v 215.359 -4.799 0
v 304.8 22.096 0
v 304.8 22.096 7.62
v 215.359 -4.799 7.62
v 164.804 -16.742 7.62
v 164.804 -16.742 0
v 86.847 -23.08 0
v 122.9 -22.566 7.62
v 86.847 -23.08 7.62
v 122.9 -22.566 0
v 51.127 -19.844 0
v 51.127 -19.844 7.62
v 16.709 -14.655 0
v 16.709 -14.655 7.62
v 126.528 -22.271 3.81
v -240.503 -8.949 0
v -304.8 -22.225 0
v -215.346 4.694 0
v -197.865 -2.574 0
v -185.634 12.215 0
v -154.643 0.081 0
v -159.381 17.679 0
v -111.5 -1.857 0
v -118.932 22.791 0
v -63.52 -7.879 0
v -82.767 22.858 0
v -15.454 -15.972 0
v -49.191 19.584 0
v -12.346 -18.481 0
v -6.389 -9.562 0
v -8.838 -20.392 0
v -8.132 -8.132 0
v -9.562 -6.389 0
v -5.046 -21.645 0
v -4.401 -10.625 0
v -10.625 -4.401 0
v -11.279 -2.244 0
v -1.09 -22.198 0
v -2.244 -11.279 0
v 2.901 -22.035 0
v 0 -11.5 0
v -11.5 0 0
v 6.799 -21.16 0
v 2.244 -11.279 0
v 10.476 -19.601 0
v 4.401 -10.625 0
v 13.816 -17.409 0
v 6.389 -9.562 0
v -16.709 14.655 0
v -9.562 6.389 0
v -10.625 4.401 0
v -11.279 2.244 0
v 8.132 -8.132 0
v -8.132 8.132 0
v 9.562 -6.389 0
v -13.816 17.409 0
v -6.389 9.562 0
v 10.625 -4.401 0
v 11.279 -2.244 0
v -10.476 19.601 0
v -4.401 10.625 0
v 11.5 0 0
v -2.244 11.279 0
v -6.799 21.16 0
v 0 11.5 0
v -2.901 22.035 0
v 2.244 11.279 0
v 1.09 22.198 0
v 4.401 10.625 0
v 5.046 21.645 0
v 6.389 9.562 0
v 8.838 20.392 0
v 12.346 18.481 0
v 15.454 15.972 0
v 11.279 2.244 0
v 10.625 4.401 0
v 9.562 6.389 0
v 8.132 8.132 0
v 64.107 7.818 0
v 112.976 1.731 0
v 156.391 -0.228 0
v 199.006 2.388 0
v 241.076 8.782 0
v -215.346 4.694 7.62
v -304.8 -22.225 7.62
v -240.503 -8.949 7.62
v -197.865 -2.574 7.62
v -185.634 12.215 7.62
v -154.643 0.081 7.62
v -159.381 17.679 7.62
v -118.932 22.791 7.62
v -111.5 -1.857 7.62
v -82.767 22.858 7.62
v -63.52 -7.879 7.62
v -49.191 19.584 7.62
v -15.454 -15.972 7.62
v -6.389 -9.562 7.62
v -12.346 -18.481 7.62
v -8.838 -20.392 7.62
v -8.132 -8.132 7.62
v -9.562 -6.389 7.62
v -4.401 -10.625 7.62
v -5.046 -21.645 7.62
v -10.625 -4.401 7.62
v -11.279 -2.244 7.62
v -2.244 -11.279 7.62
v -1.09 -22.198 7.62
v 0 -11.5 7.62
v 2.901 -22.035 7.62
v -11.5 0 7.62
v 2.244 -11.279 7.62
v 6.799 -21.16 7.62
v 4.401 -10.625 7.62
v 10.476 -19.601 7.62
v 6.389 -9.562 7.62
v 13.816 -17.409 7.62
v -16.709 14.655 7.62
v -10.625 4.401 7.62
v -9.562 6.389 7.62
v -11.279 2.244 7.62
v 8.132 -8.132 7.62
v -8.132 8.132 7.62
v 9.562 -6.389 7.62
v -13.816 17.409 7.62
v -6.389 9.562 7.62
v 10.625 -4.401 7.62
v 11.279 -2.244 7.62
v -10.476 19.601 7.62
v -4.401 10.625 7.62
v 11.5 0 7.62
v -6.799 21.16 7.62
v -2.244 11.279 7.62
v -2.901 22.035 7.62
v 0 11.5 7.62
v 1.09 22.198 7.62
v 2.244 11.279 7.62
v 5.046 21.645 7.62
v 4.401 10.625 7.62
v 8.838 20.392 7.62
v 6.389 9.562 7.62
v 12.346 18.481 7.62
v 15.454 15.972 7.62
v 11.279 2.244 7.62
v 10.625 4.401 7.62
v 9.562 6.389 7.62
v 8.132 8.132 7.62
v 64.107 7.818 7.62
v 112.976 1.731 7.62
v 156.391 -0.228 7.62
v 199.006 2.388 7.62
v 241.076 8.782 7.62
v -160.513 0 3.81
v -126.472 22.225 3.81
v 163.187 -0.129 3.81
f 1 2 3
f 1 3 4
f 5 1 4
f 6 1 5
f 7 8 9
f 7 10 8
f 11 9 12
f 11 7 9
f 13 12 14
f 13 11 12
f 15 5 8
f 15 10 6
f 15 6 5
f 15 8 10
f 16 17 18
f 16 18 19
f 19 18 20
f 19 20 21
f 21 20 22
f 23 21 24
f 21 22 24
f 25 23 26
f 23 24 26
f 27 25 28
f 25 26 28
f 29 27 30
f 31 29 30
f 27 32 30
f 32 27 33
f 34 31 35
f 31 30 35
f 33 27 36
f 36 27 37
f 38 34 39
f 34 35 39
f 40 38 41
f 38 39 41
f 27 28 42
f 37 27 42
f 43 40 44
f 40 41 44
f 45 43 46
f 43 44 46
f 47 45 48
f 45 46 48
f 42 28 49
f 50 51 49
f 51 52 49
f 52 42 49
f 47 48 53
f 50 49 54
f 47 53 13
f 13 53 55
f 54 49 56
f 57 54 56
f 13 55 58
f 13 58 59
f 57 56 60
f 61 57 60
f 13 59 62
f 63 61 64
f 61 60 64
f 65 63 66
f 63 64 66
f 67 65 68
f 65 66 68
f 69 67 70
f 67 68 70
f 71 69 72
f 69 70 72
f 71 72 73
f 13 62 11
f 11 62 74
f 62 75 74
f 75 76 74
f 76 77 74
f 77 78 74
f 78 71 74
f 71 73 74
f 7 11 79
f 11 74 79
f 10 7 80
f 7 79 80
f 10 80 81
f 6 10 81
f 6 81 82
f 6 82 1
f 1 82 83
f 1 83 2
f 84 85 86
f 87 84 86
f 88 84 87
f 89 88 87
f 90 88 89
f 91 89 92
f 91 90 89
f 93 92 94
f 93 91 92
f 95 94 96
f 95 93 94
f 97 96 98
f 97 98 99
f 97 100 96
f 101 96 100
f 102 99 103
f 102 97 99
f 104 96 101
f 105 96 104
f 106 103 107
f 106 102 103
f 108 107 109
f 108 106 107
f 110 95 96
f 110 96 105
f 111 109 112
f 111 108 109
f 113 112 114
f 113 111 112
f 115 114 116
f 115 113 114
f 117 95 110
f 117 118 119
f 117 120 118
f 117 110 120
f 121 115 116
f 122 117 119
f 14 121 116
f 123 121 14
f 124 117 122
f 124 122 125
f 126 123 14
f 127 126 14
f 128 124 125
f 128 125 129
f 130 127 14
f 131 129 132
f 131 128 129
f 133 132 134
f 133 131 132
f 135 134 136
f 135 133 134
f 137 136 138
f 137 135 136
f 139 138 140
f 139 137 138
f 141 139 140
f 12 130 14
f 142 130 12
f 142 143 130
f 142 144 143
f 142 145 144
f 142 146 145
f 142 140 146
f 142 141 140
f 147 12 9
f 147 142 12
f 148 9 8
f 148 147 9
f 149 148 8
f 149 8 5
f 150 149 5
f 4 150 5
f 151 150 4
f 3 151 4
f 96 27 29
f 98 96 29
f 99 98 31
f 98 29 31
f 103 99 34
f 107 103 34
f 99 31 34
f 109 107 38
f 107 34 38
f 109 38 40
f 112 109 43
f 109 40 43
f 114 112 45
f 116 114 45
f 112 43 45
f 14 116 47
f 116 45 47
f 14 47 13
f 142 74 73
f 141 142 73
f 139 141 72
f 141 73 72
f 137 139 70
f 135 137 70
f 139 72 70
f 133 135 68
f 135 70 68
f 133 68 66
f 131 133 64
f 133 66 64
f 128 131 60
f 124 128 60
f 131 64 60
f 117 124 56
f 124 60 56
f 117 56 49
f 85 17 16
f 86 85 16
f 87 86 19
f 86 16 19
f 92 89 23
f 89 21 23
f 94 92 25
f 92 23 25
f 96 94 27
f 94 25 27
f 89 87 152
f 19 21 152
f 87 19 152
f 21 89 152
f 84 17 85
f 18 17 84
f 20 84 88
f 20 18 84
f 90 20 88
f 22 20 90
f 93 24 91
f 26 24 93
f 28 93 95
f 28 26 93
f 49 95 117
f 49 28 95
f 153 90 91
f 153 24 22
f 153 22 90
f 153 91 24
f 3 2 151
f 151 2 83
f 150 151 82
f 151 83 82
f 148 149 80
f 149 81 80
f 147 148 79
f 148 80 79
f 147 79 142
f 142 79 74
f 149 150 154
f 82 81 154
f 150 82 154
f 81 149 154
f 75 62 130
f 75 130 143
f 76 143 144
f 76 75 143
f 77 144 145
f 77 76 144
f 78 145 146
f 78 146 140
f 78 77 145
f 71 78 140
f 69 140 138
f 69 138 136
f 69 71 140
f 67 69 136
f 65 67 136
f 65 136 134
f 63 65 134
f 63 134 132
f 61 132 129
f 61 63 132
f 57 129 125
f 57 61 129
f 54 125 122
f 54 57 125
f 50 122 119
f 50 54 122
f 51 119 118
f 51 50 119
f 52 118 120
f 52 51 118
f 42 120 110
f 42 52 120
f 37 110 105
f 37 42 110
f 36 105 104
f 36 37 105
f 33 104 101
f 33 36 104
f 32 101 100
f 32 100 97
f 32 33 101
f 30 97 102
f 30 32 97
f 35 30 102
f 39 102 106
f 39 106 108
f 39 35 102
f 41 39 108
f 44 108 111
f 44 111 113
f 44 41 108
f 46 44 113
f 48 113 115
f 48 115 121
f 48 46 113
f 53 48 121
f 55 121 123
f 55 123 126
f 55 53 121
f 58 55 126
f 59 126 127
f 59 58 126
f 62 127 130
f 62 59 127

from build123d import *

# Parameters (mm, degrees)
F0_R     = 11.5
F1_DEPTH = 7.62


with BuildPart() as f1:
    # F0 (on Top) → F1 (new body)
    with BuildSketch(Plane.XY):
        with BuildLine():
            add(Edge.make_bspline(
                [(-304.8, -22.225), (-256.281952717, -11.6462046985), (-160.9327395291, 9.5532810961), (-63.9385421445, -7.4611328072), (-15.4543146438, -15.9723130414)],
                knots=[0, 0, 0, 0, 0.5000463338, 1, 1, 1, 1], degree=3))
            ThreePointArc((-15.4543146438, -15.9723130414), (0.9093988539, -22.2063868904), (16.7085754969, -14.655174167))
            add(Edge.make_bspline(
                [(304.8, 22.0956989706), (241.4063940217, 2.2112943637), (130.6588891485, -33.0673118699), (51.2951629881, -20.2260222501), (16.7085754969, -14.655174167)],
                knots=[0, 0, 0, 0, 0.5636673589, 1, 1, 1, 1], degree=3))
            add(Edge.make_bspline(
                [(304.8, 22.0956989706), (256.7236198928, 11.6132040543), (164.0894170156, -9.7967048574), (64.3799832607, 7.3836398761), (15.4543146438, 15.9723130414)],
                knots=[0, 0, 0, 0, 0.4954943359, 1, 1, 1, 1], degree=3))
            ThreePointArc((15.4543146438, 15.9723130414), (-0.9093988539, 22.2063868904), (-16.7085754969, 14.655174167))
            add(Edge.make_bspline(
                [(-304.8, -22.225), (-241.3932358108, -2.3364681127), (-130.5990382064, 33.0196945107), (-51.285889048, 20.2245285002), (-16.7085754969, 14.655174167)],
                knots=[0, 0, 0, 0, 0.5637843557, 1, 1, 1, 1], degree=3))
        make_face()
        Circle(F0_R, mode=Mode.SUBTRACT)
    extrude(amount=F1_DEPTH)


solid = f1.part
